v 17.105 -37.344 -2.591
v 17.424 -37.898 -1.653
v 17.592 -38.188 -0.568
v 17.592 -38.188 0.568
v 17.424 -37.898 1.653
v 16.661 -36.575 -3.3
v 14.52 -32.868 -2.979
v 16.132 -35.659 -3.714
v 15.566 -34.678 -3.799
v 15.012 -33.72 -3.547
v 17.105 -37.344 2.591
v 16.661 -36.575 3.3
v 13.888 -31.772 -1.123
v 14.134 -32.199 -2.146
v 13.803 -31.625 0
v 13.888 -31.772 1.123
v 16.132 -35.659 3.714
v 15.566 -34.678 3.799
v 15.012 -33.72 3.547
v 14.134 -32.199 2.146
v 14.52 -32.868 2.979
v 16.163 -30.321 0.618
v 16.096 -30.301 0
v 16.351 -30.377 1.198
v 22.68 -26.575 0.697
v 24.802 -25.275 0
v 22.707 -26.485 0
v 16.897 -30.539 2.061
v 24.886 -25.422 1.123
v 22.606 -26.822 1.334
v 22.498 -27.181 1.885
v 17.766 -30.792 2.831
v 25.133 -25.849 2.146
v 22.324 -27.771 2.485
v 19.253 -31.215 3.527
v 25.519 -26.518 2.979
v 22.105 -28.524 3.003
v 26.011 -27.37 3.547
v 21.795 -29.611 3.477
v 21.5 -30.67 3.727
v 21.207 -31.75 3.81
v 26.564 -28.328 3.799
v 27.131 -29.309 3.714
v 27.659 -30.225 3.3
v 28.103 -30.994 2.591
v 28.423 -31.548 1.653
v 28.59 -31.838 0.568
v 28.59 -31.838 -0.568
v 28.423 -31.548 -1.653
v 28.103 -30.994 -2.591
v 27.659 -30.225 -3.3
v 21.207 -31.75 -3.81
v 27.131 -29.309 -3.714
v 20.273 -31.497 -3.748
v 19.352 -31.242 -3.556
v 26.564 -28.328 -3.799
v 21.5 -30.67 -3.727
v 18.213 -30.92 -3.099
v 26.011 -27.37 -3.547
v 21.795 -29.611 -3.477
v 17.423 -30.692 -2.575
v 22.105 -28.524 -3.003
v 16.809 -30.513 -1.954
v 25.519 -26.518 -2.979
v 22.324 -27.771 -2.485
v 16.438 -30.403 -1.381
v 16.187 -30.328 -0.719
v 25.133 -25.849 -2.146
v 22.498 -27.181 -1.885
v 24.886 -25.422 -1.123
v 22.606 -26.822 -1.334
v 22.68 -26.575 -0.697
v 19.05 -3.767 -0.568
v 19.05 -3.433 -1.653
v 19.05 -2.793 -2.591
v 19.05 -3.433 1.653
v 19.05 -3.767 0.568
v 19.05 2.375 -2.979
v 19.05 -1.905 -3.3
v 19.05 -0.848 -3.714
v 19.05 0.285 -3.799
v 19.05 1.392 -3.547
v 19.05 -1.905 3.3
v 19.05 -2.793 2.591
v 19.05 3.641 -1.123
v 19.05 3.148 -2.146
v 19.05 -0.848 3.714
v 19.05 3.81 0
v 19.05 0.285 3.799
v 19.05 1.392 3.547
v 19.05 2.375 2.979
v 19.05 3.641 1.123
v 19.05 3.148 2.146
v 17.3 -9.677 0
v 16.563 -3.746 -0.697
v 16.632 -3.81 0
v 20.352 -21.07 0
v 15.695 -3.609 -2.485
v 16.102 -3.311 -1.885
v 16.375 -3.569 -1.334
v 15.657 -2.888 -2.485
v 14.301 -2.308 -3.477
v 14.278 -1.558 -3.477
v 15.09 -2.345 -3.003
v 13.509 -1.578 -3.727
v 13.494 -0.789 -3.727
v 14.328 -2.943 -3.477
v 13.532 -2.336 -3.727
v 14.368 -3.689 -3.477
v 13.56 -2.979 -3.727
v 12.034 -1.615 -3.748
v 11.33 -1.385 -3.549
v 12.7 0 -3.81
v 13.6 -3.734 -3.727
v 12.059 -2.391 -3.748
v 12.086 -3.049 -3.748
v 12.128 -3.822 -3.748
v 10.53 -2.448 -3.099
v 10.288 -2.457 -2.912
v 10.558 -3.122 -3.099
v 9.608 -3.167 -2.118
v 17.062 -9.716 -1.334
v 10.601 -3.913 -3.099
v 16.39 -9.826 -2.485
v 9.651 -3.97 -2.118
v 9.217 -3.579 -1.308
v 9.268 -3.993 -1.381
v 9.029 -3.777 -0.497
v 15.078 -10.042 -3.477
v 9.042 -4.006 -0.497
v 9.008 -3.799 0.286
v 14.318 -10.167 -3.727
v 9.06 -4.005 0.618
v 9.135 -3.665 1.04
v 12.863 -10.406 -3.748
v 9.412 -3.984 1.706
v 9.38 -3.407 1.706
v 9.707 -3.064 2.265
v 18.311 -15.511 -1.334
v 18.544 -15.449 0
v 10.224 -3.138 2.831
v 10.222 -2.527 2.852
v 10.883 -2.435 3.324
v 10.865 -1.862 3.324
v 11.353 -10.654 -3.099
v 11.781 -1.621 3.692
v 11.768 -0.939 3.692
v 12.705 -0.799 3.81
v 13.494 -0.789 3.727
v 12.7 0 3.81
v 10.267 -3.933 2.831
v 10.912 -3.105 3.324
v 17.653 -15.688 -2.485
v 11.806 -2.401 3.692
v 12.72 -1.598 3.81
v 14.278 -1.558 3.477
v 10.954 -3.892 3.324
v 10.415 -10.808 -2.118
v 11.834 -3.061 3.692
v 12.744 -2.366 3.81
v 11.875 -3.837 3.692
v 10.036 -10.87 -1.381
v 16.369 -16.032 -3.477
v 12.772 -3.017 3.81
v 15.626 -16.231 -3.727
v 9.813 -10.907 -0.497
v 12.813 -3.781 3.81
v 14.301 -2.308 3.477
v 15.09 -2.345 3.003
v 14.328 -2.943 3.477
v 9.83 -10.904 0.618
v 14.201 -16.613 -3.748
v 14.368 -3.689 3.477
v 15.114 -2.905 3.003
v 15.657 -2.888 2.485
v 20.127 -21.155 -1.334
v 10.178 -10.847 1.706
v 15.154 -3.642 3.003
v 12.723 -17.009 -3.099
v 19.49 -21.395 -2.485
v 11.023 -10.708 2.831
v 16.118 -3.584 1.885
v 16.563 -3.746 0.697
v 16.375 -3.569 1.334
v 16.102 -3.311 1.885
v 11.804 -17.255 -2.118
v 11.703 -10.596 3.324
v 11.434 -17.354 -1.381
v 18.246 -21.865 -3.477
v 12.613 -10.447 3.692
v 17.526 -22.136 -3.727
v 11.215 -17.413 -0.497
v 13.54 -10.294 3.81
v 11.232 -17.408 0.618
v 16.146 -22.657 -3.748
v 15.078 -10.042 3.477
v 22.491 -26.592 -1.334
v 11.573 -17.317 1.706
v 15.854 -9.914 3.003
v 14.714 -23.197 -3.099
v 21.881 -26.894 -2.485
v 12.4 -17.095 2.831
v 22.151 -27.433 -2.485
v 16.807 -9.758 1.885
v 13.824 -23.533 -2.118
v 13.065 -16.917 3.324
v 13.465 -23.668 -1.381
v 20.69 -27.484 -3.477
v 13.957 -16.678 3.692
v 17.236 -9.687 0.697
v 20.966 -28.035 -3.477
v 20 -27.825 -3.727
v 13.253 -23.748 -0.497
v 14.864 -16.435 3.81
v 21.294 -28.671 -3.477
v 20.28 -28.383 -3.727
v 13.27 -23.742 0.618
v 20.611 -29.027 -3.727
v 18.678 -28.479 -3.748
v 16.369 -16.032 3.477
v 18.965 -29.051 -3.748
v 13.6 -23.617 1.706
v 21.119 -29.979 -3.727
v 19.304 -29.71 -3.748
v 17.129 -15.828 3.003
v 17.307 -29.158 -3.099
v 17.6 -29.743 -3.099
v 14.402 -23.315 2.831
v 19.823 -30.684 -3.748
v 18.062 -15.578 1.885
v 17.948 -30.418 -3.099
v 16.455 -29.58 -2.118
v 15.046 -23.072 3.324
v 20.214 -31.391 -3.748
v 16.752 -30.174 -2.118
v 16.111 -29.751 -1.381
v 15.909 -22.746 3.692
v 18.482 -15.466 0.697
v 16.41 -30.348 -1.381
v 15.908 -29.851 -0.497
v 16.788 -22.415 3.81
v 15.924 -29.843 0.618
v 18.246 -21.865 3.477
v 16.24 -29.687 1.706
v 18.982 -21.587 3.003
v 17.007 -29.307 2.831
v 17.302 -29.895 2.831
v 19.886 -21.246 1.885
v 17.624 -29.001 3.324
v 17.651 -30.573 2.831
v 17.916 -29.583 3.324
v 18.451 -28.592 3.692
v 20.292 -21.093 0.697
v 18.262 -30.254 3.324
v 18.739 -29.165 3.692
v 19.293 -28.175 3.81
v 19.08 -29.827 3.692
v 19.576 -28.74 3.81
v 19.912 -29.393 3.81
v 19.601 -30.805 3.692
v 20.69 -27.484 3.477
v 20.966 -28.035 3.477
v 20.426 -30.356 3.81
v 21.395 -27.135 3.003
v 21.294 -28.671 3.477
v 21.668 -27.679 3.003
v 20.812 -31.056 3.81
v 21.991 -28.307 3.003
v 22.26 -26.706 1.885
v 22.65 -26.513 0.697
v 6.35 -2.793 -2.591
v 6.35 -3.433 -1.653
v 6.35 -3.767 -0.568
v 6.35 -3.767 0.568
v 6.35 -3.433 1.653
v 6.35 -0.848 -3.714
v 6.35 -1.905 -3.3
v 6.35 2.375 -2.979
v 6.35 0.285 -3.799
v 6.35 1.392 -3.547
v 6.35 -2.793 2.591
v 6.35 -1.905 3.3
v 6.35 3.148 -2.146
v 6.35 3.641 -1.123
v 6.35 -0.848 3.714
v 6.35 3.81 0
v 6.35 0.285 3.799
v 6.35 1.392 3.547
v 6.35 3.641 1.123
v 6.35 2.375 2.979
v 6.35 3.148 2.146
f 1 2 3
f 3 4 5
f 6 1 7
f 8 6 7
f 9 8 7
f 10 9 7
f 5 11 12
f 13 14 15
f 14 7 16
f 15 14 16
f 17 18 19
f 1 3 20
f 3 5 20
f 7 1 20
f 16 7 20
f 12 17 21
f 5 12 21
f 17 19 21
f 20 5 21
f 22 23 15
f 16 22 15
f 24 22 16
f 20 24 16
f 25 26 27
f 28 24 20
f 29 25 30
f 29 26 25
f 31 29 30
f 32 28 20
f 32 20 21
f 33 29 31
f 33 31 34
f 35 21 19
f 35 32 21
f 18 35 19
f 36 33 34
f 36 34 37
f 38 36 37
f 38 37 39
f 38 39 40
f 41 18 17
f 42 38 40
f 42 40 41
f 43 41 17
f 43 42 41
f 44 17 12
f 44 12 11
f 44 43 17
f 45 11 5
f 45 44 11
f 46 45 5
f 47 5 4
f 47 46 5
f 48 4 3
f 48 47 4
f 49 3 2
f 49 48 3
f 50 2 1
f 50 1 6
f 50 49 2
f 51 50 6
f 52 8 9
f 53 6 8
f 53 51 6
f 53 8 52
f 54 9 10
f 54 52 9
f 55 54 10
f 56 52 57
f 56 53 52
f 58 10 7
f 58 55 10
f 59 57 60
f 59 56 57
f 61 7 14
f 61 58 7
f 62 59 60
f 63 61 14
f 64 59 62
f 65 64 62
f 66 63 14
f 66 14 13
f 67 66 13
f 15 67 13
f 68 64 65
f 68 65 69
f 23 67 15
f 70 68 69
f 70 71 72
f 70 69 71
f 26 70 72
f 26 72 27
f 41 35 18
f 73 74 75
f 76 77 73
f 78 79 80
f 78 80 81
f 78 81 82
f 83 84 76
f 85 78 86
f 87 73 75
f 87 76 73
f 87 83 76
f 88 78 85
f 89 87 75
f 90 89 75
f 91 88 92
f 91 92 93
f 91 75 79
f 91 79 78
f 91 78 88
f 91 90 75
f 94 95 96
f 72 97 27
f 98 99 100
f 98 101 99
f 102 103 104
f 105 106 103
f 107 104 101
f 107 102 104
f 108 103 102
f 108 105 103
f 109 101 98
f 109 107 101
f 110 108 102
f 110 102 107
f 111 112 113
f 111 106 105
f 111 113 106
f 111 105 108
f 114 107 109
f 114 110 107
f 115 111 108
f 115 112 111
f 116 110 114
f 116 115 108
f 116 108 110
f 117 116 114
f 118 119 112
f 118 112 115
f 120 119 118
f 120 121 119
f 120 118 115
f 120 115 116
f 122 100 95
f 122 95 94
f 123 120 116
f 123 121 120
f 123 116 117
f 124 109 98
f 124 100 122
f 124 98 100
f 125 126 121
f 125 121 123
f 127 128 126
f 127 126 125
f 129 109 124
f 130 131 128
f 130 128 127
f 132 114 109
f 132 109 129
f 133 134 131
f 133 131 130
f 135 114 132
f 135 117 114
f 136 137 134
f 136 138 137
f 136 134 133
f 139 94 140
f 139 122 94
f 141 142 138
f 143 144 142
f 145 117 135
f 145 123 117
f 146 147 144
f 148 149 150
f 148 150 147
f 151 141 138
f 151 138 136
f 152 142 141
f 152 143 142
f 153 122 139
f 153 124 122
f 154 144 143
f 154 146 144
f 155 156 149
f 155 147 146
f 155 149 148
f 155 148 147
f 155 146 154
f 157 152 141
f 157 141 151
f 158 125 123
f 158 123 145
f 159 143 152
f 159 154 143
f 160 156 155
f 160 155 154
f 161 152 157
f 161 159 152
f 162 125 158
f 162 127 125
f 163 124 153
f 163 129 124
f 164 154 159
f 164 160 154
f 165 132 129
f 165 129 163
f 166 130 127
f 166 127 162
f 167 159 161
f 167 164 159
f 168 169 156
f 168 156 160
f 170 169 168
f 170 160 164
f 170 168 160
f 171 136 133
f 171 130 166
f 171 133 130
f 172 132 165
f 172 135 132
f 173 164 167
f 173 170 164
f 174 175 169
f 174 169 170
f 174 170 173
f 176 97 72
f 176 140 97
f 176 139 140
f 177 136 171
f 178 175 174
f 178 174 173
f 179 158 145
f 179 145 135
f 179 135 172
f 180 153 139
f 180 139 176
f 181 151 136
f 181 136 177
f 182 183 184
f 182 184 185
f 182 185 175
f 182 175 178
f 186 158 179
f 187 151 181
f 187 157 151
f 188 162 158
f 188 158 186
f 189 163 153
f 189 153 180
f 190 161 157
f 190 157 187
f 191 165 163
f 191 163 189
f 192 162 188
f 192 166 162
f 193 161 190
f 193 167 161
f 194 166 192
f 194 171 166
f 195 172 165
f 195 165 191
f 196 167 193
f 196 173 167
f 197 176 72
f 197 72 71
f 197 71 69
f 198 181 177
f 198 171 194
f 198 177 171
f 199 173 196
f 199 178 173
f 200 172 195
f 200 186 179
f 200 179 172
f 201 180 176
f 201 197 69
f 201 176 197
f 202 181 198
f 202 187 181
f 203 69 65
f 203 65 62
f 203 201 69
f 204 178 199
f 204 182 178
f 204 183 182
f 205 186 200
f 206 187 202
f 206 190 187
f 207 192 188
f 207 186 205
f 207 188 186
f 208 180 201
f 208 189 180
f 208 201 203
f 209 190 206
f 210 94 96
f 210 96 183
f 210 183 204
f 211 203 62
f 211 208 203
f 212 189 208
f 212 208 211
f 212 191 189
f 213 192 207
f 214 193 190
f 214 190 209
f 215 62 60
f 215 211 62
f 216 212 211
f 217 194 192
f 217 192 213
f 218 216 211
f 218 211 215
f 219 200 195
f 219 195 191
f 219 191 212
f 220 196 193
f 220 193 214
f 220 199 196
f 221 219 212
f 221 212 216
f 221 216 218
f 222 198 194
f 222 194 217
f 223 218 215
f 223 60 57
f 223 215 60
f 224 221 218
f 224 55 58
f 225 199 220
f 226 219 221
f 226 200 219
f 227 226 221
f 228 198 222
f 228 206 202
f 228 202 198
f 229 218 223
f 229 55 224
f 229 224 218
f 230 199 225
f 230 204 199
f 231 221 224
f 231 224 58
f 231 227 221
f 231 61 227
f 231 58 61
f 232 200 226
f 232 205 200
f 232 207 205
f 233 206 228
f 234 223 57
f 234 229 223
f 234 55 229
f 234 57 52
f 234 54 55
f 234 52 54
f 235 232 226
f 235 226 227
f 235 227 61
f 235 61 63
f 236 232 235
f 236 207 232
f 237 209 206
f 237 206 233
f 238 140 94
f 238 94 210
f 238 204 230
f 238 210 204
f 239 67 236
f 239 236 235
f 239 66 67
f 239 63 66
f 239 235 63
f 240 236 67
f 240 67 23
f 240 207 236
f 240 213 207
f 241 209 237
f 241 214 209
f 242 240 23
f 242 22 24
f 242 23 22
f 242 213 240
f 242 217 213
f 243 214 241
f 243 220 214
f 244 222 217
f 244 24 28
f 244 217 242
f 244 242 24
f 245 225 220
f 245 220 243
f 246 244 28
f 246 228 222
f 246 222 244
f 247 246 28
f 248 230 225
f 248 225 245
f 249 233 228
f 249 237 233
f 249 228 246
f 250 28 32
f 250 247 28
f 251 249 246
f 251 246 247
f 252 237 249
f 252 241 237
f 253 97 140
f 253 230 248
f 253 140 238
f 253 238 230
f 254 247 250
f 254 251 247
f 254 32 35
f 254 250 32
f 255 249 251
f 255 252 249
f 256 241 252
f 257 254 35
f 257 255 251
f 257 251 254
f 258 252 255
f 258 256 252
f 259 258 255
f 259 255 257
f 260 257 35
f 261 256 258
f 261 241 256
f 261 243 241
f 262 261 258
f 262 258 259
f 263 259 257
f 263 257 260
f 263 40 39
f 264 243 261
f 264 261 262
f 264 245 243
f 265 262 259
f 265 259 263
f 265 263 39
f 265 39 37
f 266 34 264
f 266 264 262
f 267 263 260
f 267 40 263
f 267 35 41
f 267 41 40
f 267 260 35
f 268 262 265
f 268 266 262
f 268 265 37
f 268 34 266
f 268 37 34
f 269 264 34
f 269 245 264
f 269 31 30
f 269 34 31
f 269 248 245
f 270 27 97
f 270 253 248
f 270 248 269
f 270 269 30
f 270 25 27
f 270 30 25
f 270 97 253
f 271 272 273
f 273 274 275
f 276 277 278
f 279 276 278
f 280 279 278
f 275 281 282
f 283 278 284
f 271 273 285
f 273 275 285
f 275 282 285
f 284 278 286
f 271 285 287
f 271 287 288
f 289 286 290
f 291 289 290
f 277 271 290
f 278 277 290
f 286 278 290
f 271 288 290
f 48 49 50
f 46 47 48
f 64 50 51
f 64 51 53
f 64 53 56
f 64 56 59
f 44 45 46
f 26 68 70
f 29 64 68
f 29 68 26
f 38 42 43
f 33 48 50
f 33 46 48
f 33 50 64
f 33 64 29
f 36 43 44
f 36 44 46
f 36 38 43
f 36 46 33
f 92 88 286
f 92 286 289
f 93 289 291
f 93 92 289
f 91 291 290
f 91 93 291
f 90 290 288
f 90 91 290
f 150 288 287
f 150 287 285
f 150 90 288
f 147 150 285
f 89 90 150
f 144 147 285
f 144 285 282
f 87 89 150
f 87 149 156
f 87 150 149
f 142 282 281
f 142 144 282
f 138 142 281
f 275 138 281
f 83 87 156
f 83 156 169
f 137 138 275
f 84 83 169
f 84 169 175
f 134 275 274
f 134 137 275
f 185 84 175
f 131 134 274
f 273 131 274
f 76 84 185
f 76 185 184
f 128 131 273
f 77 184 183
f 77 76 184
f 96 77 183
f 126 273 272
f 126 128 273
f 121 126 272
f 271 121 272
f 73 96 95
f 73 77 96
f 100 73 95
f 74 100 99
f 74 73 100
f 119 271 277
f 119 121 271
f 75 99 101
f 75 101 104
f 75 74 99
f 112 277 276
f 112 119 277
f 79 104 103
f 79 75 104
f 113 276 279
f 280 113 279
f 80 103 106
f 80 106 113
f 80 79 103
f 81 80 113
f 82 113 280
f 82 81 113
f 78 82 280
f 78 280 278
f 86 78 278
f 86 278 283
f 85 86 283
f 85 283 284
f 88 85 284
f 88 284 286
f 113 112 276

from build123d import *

# Parameters (mm, degrees)
F0_R     = 3.81
F4_R     = 3.81
F5_DEPTH = 6.35
F8_R     = 3.81
F9_DEPTH = 6.35


with BuildPart() as f2:
    # F2: sweep along a path in F1
    with BuildLine(Plane.XY) as f2_path:
        ThreePointArc((0, 0), (2.5964520368, -19.7220112368), (10.2088642316, -38.1))
    # F0 (on Front) → F2 (sweep)
    with BuildSketch(Plane.XZ):
        with Locations((12.7, 0)):
            Circle(F0_R)
    sweep(path=f2_path.line)

    # F4 (on offset) → F5 (join, symmetric)
    with BuildSketch(Plane.YZ.offset(12.7)):
        Circle(F4_R)
    extrude(amount=F5_DEPTH, both=True)

    # F8 (on face) → F9 (join, symmetric)
    with BuildSketch(Plane(origin=(2.1573868597, 1.2455678842, 0), x_dir=(-0.5, 0.8660254038, 0), z_dir=(0.8660254038, 0.5, 0))):
        with Locations((-38.1, 0)):
            Circle(F8_R)
    extrude(amount=F9_DEPTH, both=True)


solid = f2.part
